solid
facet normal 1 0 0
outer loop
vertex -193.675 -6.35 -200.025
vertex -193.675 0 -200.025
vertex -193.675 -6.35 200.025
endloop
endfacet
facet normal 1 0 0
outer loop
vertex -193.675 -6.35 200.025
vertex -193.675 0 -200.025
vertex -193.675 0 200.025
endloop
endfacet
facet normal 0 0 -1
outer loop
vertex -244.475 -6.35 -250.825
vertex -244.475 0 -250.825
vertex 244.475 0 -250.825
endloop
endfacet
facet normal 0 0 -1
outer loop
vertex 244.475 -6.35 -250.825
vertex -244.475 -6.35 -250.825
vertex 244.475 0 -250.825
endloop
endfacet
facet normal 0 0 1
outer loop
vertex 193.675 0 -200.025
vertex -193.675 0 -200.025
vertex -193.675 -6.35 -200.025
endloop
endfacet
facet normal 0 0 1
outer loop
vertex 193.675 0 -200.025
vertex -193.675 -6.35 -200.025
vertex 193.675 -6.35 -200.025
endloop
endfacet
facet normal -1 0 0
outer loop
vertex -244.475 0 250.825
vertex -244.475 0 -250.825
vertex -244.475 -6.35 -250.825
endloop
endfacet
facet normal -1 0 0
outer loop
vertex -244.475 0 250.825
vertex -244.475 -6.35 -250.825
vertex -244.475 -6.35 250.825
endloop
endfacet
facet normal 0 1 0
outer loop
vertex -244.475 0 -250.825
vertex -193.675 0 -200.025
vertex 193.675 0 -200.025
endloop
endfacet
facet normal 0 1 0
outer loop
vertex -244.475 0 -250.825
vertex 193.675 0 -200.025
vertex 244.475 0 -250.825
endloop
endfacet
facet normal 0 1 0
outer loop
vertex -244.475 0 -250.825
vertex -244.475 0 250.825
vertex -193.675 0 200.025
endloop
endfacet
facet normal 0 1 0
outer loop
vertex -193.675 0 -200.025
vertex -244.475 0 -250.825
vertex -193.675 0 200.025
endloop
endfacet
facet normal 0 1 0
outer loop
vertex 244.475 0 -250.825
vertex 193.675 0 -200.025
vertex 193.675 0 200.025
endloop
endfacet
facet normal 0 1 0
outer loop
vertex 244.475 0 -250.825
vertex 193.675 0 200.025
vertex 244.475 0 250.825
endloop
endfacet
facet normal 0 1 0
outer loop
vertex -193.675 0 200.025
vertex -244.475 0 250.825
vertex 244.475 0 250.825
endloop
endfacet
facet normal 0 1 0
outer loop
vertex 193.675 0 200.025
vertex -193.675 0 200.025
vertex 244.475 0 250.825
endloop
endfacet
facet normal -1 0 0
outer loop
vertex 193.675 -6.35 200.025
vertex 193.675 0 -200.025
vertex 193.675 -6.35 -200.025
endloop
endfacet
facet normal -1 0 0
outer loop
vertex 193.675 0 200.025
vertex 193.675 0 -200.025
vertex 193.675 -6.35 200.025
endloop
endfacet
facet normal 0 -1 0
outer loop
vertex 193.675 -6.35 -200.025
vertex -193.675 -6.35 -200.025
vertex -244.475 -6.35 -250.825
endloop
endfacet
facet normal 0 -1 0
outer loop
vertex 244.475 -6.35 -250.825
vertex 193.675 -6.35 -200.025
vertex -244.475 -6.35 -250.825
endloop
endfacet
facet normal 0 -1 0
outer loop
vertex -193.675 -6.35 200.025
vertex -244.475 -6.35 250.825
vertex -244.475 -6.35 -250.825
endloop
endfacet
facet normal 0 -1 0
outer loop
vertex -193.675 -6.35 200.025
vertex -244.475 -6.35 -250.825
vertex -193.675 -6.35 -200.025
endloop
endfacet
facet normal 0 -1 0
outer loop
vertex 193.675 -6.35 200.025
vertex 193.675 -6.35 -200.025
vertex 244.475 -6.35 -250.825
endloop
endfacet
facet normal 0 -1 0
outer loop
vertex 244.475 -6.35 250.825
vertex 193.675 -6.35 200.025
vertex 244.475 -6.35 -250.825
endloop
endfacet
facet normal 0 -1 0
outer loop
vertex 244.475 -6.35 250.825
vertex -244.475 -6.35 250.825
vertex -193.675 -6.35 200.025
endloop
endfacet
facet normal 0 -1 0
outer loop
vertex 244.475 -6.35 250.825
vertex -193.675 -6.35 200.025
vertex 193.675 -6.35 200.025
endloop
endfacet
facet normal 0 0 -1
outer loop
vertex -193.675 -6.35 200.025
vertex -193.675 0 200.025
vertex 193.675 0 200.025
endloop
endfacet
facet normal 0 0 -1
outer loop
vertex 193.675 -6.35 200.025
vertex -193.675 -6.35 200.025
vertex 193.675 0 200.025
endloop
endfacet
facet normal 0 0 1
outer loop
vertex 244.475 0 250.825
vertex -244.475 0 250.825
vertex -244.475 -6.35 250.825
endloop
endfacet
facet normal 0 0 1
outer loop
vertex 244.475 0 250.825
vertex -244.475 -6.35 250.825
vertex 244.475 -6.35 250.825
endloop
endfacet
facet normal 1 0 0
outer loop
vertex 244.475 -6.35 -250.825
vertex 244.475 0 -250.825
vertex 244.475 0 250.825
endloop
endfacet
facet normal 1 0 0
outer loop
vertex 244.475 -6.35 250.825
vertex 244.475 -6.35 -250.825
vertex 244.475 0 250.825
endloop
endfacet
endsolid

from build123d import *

# Parameters (mm, degrees)
SKETCH_W   = 488.95
SKETCH_H   = 501.65
SKETCH_W_2 = 387.35
SKETCH_H_2 = 400.05
PAD_DEPTH  = 6.35


with BuildPart() as part:
    # Sketch → Pad (new body)
    with BuildSketch(Plane.XZ):
        Rectangle(SKETCH_W, SKETCH_H)
        Rectangle(SKETCH_W_2, SKETCH_H_2, mode=Mode.SUBTRACT)
    extrude(amount=PAD_DEPTH)


solid = part.part
